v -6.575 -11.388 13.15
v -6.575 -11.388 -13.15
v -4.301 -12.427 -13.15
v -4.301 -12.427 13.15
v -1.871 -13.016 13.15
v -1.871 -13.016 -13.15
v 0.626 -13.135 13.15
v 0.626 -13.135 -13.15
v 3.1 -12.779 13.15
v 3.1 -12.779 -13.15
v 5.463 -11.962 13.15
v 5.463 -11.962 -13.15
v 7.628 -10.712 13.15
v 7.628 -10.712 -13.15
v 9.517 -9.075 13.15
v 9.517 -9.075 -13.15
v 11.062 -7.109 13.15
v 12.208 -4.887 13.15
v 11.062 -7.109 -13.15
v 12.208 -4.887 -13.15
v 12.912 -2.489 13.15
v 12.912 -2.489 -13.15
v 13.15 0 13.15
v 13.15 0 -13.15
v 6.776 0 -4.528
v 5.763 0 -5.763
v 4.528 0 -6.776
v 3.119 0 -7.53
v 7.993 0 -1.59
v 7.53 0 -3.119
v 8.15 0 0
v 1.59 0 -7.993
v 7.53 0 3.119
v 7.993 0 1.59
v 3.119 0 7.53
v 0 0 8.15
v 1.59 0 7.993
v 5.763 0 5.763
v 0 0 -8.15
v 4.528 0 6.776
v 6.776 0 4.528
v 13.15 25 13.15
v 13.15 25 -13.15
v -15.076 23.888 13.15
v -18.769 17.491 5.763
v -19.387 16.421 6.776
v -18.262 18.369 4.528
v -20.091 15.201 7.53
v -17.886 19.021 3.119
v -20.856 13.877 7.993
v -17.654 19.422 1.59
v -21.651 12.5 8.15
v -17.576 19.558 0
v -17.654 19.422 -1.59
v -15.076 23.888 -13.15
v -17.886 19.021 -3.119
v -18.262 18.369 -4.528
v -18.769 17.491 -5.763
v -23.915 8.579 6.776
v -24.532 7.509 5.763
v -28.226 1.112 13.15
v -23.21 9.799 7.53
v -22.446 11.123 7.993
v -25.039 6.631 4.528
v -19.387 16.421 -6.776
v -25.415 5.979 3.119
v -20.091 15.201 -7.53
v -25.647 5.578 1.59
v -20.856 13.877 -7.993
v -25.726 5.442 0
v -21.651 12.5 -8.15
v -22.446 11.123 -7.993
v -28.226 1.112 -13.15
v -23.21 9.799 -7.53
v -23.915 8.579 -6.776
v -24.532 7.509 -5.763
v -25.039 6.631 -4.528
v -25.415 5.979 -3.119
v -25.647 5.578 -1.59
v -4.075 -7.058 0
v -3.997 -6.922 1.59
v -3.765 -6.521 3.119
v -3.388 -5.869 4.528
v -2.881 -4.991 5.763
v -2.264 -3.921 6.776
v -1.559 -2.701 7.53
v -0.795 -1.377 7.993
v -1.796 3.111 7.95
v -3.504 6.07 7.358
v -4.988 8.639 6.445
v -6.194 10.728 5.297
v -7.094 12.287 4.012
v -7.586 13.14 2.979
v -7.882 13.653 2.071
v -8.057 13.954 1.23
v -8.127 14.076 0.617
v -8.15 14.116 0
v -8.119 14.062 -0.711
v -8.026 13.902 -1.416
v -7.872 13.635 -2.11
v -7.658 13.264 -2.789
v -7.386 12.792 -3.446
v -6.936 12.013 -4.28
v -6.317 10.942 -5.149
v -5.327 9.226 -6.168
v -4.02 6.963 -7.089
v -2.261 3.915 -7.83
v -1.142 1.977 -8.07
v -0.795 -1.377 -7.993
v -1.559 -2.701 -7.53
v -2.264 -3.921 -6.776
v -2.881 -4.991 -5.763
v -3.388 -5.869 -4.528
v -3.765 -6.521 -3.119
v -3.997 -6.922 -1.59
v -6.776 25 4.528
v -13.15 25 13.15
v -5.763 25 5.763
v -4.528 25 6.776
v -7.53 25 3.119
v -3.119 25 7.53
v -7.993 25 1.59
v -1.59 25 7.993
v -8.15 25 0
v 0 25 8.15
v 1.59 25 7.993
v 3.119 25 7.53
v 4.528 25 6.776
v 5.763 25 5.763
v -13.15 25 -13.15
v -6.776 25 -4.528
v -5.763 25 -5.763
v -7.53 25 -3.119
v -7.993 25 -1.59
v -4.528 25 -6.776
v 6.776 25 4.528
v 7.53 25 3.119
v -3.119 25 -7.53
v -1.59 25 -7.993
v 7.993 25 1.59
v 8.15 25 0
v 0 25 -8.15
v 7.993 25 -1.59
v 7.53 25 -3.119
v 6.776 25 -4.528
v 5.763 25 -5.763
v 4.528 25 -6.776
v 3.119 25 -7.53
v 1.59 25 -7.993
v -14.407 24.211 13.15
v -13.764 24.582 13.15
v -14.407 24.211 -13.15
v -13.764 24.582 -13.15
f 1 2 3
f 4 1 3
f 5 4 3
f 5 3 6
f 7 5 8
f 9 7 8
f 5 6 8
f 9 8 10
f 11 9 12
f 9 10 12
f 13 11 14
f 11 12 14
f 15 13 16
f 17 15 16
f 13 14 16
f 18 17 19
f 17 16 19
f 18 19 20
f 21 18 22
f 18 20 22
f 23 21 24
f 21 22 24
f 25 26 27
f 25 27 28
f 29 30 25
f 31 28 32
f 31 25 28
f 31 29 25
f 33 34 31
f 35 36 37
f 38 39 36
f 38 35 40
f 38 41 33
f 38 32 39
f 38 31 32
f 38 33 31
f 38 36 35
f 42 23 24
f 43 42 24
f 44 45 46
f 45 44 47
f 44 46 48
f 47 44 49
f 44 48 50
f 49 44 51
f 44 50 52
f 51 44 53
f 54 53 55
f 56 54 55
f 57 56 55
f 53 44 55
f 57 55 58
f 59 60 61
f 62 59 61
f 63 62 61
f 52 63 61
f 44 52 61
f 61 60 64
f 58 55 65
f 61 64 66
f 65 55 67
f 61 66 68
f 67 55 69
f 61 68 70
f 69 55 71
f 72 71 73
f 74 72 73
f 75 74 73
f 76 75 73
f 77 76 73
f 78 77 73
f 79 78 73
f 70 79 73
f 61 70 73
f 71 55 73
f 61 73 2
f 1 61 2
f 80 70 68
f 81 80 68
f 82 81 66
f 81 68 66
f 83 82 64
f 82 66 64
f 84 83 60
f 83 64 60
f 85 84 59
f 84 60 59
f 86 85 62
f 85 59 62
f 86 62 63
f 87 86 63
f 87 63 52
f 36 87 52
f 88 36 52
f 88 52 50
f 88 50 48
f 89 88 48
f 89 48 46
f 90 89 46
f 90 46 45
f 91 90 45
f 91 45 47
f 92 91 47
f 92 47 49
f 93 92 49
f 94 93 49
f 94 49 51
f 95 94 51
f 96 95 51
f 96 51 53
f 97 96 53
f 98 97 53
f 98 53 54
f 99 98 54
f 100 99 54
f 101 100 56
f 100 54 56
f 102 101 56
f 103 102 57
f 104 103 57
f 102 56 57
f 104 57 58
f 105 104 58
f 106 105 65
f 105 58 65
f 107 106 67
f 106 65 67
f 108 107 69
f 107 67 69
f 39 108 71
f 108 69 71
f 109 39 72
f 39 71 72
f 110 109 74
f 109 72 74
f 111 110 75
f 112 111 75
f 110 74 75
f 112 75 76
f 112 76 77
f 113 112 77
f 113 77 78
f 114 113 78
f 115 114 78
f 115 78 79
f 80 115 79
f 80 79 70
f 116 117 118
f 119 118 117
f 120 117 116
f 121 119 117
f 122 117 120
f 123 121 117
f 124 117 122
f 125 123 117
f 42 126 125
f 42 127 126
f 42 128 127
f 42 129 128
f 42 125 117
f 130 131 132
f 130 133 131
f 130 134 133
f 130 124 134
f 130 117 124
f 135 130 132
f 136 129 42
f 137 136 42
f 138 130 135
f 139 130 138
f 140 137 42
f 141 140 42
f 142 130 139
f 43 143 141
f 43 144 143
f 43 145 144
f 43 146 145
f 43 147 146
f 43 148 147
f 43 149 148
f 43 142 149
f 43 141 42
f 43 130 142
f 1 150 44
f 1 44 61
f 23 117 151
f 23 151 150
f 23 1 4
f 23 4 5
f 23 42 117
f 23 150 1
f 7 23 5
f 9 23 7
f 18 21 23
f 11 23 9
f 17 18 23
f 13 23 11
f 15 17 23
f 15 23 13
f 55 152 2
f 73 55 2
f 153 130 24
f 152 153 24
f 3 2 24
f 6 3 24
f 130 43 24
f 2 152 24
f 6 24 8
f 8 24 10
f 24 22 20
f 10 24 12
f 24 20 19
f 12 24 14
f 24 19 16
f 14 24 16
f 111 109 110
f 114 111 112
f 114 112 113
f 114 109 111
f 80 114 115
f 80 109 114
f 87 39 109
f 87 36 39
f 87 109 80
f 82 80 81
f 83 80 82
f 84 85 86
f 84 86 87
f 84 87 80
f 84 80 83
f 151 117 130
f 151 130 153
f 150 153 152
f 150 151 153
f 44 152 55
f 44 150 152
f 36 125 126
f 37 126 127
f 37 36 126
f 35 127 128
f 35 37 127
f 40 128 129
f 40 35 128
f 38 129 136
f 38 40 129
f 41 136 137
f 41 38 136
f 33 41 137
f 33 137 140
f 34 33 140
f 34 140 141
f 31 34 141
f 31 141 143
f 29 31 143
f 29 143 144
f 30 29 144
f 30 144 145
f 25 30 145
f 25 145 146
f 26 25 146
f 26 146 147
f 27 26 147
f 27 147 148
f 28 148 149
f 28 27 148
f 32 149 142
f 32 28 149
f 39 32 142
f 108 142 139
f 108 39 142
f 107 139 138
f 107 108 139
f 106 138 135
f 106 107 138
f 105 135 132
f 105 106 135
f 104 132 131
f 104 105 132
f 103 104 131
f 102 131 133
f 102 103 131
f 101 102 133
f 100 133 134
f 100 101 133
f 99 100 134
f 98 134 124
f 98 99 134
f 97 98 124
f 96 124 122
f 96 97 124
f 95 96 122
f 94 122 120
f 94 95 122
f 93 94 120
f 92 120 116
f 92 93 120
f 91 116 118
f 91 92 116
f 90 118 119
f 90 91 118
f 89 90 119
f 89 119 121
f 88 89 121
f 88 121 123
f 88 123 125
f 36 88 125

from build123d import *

# Parameters (mm, degrees)
SKETCH2_R                = 13.15
SKETCH2_R_2              = 8.15
BOSS_EXTRUDE1_DEPTH      = 25
BOSS_EXTRUDE2_DEPTH      = 13.15
BOSS_EXTRUDE2_DEPTH_BACK = 13.15
SKETCH4_R                = 8.15
CUT_EXTRUDE1_DEPTH       = 25
CUT_EXTRUDE2_START       = -25
SKETCH5_R                = 8.15
CUT_EXTRUDE2_DEPTH       = 25
FILLET1_R                = 10


with BuildPart() as part:
    # Sketch2 → Boss-Extrude1 (new body)
    # profile 1 of 5: a face of its own
    with BuildSketch(Plane(origin=(0, 0, 0), x_dir=(1, 0, 0), z_dir=(0, 1, 0))):
        with BuildLine():
            Line((-13.15, 13.15), (-13.15, 0))
            ThreePointArc((-13.15, 0), (-9.298454179, 9.298454166), (-1.9e-08, 13.15))
            Line((-1.9e-08, 13.15), (-13.15, 13.15))
        make_face()
    # profile 2 of 5: a face of its own
    with BuildSketch(Plane(origin=(0, 0, 0), x_dir=(1, 0, 0), z_dir=(0, 1, 0))):
        Circle(SKETCH2_R)
        with Locations(Location((0, 0, 0), (0, 0, 270))):
            Circle(SKETCH2_R_2, mode=Mode.SUBTRACT)
    # profile 3 of 5: a face of its own
    with BuildSketch(Plane(origin=(0, 0, 0), x_dir=(1, 0, 0), z_dir=(0, 1, 0))):
        with BuildLine():
            ThreePointArc((-1.9e-08, 13.15), (9.298454166, 9.298454179), (13.15, 0))
            Line((13.15, 0), (13.15, 13.15))
            Line((13.15, 13.15), (-1.9e-08, 13.15))
        make_face()
    # profile 4 of 5: a face of its own
    with BuildSketch(Plane(origin=(0, 0, 0), x_dir=(1, 0, 0), z_dir=(0, 1, 0))):
        with BuildLine():
            ThreePointArc((13.15, 0), (9.298454189, -9.298454156), (4.6e-08, -13.15))
            Line((4.6e-08, -13.15), (13.15, -13.15))
            Line((13.15, -13.15), (13.15, 0))
        make_face()
    # profile 5 of 5: a face of its own
    with BuildSketch(Plane(origin=(0, 0, 0), x_dir=(1, 0, 0), z_dir=(0, 1, 0))):
        with BuildLine():
            Line((-13.15, 0), (-13.15, -13.15))
            Line((-13.15, -13.15), (4.6e-08, -13.15))
            ThreePointArc((4.6e-08, -13.15), (-9.298454156, -9.298454189), (-13.15, 0))
        make_face()
    extrude(amount=BOSS_EXTRUDE1_DEPTH)

    # Sketch3 → Boss-Extrude2 (add, two sides: drawn at the far end of the back side and taken through both)
    with BuildSketch(Plane.XY.offset(-BOSS_EXTRUDE2_DEPTH_BACK)):
        with BuildLine():
            Line((-28.225635095, 1.11176594), (-6.575, -11.38823406))
            ThreePointArc((-6.575, -11.38823406), (11.38823406, -6.575), (6.575, 11.38823406))
            Line((6.575, 11.38823406), (-15.075635095, 23.88823406))
            Line((-15.075635095, 23.88823406), (-28.225635095, 1.11176594))
        make_face()
    extrude(amount=BOSS_EXTRUDE2_DEPTH + BOSS_EXTRUDE2_DEPTH_BACK)

    # Sketch4 → Cut-Extrude1 (cut)
    with BuildSketch(Plane(origin=(-21.650635095, 12.5, 0), x_dir=(0, 0, 1), z_dir=(-0.8660254037844418, 0.49999999999999445, 0))):
        with Locations(Location((0, 0, 0), (0, 0, 270))):
            Circle(SKETCH4_R)
    extrude(amount=-CUT_EXTRUDE1_DEPTH, mode=Mode.SUBTRACT)

    # Sketch5 → Cut-Extrude2 (cut)
    with BuildSketch(Plane(origin=(0, 25, 0), x_dir=(1, 0, 0), z_dir=(0, 1, 0)).offset(CUT_EXTRUDE2_START)):
        with Locations(Location((0, 0, 0), (0, 0, 270))):
            Circle(SKETCH5_R)
    extrude(amount=CUT_EXTRUDE2_DEPTH, mode=Mode.SUBTRACT)

    # Fillet1
    # the kernel refuses this fillet: 10 mm, written as the material it adds along each edge
    with BuildSketch(Plane(origin=(-13.15, 22.77646812, 13.15), x_dir=(0, 1, 0), z_dir=(0, 0, -1))) as fillet1_piece_1:
        with BuildLine():
            CenterArc((10.274215146, -5.93182088), FILLET1_R, 143.616854507, 12.766290987)
            Line((1.11176594, -1.925635095), (0, 0))
            Line((0, 0), (2.22353188, 0))
        make_face()
    extrude(amount=26.3)


solid = part.part
